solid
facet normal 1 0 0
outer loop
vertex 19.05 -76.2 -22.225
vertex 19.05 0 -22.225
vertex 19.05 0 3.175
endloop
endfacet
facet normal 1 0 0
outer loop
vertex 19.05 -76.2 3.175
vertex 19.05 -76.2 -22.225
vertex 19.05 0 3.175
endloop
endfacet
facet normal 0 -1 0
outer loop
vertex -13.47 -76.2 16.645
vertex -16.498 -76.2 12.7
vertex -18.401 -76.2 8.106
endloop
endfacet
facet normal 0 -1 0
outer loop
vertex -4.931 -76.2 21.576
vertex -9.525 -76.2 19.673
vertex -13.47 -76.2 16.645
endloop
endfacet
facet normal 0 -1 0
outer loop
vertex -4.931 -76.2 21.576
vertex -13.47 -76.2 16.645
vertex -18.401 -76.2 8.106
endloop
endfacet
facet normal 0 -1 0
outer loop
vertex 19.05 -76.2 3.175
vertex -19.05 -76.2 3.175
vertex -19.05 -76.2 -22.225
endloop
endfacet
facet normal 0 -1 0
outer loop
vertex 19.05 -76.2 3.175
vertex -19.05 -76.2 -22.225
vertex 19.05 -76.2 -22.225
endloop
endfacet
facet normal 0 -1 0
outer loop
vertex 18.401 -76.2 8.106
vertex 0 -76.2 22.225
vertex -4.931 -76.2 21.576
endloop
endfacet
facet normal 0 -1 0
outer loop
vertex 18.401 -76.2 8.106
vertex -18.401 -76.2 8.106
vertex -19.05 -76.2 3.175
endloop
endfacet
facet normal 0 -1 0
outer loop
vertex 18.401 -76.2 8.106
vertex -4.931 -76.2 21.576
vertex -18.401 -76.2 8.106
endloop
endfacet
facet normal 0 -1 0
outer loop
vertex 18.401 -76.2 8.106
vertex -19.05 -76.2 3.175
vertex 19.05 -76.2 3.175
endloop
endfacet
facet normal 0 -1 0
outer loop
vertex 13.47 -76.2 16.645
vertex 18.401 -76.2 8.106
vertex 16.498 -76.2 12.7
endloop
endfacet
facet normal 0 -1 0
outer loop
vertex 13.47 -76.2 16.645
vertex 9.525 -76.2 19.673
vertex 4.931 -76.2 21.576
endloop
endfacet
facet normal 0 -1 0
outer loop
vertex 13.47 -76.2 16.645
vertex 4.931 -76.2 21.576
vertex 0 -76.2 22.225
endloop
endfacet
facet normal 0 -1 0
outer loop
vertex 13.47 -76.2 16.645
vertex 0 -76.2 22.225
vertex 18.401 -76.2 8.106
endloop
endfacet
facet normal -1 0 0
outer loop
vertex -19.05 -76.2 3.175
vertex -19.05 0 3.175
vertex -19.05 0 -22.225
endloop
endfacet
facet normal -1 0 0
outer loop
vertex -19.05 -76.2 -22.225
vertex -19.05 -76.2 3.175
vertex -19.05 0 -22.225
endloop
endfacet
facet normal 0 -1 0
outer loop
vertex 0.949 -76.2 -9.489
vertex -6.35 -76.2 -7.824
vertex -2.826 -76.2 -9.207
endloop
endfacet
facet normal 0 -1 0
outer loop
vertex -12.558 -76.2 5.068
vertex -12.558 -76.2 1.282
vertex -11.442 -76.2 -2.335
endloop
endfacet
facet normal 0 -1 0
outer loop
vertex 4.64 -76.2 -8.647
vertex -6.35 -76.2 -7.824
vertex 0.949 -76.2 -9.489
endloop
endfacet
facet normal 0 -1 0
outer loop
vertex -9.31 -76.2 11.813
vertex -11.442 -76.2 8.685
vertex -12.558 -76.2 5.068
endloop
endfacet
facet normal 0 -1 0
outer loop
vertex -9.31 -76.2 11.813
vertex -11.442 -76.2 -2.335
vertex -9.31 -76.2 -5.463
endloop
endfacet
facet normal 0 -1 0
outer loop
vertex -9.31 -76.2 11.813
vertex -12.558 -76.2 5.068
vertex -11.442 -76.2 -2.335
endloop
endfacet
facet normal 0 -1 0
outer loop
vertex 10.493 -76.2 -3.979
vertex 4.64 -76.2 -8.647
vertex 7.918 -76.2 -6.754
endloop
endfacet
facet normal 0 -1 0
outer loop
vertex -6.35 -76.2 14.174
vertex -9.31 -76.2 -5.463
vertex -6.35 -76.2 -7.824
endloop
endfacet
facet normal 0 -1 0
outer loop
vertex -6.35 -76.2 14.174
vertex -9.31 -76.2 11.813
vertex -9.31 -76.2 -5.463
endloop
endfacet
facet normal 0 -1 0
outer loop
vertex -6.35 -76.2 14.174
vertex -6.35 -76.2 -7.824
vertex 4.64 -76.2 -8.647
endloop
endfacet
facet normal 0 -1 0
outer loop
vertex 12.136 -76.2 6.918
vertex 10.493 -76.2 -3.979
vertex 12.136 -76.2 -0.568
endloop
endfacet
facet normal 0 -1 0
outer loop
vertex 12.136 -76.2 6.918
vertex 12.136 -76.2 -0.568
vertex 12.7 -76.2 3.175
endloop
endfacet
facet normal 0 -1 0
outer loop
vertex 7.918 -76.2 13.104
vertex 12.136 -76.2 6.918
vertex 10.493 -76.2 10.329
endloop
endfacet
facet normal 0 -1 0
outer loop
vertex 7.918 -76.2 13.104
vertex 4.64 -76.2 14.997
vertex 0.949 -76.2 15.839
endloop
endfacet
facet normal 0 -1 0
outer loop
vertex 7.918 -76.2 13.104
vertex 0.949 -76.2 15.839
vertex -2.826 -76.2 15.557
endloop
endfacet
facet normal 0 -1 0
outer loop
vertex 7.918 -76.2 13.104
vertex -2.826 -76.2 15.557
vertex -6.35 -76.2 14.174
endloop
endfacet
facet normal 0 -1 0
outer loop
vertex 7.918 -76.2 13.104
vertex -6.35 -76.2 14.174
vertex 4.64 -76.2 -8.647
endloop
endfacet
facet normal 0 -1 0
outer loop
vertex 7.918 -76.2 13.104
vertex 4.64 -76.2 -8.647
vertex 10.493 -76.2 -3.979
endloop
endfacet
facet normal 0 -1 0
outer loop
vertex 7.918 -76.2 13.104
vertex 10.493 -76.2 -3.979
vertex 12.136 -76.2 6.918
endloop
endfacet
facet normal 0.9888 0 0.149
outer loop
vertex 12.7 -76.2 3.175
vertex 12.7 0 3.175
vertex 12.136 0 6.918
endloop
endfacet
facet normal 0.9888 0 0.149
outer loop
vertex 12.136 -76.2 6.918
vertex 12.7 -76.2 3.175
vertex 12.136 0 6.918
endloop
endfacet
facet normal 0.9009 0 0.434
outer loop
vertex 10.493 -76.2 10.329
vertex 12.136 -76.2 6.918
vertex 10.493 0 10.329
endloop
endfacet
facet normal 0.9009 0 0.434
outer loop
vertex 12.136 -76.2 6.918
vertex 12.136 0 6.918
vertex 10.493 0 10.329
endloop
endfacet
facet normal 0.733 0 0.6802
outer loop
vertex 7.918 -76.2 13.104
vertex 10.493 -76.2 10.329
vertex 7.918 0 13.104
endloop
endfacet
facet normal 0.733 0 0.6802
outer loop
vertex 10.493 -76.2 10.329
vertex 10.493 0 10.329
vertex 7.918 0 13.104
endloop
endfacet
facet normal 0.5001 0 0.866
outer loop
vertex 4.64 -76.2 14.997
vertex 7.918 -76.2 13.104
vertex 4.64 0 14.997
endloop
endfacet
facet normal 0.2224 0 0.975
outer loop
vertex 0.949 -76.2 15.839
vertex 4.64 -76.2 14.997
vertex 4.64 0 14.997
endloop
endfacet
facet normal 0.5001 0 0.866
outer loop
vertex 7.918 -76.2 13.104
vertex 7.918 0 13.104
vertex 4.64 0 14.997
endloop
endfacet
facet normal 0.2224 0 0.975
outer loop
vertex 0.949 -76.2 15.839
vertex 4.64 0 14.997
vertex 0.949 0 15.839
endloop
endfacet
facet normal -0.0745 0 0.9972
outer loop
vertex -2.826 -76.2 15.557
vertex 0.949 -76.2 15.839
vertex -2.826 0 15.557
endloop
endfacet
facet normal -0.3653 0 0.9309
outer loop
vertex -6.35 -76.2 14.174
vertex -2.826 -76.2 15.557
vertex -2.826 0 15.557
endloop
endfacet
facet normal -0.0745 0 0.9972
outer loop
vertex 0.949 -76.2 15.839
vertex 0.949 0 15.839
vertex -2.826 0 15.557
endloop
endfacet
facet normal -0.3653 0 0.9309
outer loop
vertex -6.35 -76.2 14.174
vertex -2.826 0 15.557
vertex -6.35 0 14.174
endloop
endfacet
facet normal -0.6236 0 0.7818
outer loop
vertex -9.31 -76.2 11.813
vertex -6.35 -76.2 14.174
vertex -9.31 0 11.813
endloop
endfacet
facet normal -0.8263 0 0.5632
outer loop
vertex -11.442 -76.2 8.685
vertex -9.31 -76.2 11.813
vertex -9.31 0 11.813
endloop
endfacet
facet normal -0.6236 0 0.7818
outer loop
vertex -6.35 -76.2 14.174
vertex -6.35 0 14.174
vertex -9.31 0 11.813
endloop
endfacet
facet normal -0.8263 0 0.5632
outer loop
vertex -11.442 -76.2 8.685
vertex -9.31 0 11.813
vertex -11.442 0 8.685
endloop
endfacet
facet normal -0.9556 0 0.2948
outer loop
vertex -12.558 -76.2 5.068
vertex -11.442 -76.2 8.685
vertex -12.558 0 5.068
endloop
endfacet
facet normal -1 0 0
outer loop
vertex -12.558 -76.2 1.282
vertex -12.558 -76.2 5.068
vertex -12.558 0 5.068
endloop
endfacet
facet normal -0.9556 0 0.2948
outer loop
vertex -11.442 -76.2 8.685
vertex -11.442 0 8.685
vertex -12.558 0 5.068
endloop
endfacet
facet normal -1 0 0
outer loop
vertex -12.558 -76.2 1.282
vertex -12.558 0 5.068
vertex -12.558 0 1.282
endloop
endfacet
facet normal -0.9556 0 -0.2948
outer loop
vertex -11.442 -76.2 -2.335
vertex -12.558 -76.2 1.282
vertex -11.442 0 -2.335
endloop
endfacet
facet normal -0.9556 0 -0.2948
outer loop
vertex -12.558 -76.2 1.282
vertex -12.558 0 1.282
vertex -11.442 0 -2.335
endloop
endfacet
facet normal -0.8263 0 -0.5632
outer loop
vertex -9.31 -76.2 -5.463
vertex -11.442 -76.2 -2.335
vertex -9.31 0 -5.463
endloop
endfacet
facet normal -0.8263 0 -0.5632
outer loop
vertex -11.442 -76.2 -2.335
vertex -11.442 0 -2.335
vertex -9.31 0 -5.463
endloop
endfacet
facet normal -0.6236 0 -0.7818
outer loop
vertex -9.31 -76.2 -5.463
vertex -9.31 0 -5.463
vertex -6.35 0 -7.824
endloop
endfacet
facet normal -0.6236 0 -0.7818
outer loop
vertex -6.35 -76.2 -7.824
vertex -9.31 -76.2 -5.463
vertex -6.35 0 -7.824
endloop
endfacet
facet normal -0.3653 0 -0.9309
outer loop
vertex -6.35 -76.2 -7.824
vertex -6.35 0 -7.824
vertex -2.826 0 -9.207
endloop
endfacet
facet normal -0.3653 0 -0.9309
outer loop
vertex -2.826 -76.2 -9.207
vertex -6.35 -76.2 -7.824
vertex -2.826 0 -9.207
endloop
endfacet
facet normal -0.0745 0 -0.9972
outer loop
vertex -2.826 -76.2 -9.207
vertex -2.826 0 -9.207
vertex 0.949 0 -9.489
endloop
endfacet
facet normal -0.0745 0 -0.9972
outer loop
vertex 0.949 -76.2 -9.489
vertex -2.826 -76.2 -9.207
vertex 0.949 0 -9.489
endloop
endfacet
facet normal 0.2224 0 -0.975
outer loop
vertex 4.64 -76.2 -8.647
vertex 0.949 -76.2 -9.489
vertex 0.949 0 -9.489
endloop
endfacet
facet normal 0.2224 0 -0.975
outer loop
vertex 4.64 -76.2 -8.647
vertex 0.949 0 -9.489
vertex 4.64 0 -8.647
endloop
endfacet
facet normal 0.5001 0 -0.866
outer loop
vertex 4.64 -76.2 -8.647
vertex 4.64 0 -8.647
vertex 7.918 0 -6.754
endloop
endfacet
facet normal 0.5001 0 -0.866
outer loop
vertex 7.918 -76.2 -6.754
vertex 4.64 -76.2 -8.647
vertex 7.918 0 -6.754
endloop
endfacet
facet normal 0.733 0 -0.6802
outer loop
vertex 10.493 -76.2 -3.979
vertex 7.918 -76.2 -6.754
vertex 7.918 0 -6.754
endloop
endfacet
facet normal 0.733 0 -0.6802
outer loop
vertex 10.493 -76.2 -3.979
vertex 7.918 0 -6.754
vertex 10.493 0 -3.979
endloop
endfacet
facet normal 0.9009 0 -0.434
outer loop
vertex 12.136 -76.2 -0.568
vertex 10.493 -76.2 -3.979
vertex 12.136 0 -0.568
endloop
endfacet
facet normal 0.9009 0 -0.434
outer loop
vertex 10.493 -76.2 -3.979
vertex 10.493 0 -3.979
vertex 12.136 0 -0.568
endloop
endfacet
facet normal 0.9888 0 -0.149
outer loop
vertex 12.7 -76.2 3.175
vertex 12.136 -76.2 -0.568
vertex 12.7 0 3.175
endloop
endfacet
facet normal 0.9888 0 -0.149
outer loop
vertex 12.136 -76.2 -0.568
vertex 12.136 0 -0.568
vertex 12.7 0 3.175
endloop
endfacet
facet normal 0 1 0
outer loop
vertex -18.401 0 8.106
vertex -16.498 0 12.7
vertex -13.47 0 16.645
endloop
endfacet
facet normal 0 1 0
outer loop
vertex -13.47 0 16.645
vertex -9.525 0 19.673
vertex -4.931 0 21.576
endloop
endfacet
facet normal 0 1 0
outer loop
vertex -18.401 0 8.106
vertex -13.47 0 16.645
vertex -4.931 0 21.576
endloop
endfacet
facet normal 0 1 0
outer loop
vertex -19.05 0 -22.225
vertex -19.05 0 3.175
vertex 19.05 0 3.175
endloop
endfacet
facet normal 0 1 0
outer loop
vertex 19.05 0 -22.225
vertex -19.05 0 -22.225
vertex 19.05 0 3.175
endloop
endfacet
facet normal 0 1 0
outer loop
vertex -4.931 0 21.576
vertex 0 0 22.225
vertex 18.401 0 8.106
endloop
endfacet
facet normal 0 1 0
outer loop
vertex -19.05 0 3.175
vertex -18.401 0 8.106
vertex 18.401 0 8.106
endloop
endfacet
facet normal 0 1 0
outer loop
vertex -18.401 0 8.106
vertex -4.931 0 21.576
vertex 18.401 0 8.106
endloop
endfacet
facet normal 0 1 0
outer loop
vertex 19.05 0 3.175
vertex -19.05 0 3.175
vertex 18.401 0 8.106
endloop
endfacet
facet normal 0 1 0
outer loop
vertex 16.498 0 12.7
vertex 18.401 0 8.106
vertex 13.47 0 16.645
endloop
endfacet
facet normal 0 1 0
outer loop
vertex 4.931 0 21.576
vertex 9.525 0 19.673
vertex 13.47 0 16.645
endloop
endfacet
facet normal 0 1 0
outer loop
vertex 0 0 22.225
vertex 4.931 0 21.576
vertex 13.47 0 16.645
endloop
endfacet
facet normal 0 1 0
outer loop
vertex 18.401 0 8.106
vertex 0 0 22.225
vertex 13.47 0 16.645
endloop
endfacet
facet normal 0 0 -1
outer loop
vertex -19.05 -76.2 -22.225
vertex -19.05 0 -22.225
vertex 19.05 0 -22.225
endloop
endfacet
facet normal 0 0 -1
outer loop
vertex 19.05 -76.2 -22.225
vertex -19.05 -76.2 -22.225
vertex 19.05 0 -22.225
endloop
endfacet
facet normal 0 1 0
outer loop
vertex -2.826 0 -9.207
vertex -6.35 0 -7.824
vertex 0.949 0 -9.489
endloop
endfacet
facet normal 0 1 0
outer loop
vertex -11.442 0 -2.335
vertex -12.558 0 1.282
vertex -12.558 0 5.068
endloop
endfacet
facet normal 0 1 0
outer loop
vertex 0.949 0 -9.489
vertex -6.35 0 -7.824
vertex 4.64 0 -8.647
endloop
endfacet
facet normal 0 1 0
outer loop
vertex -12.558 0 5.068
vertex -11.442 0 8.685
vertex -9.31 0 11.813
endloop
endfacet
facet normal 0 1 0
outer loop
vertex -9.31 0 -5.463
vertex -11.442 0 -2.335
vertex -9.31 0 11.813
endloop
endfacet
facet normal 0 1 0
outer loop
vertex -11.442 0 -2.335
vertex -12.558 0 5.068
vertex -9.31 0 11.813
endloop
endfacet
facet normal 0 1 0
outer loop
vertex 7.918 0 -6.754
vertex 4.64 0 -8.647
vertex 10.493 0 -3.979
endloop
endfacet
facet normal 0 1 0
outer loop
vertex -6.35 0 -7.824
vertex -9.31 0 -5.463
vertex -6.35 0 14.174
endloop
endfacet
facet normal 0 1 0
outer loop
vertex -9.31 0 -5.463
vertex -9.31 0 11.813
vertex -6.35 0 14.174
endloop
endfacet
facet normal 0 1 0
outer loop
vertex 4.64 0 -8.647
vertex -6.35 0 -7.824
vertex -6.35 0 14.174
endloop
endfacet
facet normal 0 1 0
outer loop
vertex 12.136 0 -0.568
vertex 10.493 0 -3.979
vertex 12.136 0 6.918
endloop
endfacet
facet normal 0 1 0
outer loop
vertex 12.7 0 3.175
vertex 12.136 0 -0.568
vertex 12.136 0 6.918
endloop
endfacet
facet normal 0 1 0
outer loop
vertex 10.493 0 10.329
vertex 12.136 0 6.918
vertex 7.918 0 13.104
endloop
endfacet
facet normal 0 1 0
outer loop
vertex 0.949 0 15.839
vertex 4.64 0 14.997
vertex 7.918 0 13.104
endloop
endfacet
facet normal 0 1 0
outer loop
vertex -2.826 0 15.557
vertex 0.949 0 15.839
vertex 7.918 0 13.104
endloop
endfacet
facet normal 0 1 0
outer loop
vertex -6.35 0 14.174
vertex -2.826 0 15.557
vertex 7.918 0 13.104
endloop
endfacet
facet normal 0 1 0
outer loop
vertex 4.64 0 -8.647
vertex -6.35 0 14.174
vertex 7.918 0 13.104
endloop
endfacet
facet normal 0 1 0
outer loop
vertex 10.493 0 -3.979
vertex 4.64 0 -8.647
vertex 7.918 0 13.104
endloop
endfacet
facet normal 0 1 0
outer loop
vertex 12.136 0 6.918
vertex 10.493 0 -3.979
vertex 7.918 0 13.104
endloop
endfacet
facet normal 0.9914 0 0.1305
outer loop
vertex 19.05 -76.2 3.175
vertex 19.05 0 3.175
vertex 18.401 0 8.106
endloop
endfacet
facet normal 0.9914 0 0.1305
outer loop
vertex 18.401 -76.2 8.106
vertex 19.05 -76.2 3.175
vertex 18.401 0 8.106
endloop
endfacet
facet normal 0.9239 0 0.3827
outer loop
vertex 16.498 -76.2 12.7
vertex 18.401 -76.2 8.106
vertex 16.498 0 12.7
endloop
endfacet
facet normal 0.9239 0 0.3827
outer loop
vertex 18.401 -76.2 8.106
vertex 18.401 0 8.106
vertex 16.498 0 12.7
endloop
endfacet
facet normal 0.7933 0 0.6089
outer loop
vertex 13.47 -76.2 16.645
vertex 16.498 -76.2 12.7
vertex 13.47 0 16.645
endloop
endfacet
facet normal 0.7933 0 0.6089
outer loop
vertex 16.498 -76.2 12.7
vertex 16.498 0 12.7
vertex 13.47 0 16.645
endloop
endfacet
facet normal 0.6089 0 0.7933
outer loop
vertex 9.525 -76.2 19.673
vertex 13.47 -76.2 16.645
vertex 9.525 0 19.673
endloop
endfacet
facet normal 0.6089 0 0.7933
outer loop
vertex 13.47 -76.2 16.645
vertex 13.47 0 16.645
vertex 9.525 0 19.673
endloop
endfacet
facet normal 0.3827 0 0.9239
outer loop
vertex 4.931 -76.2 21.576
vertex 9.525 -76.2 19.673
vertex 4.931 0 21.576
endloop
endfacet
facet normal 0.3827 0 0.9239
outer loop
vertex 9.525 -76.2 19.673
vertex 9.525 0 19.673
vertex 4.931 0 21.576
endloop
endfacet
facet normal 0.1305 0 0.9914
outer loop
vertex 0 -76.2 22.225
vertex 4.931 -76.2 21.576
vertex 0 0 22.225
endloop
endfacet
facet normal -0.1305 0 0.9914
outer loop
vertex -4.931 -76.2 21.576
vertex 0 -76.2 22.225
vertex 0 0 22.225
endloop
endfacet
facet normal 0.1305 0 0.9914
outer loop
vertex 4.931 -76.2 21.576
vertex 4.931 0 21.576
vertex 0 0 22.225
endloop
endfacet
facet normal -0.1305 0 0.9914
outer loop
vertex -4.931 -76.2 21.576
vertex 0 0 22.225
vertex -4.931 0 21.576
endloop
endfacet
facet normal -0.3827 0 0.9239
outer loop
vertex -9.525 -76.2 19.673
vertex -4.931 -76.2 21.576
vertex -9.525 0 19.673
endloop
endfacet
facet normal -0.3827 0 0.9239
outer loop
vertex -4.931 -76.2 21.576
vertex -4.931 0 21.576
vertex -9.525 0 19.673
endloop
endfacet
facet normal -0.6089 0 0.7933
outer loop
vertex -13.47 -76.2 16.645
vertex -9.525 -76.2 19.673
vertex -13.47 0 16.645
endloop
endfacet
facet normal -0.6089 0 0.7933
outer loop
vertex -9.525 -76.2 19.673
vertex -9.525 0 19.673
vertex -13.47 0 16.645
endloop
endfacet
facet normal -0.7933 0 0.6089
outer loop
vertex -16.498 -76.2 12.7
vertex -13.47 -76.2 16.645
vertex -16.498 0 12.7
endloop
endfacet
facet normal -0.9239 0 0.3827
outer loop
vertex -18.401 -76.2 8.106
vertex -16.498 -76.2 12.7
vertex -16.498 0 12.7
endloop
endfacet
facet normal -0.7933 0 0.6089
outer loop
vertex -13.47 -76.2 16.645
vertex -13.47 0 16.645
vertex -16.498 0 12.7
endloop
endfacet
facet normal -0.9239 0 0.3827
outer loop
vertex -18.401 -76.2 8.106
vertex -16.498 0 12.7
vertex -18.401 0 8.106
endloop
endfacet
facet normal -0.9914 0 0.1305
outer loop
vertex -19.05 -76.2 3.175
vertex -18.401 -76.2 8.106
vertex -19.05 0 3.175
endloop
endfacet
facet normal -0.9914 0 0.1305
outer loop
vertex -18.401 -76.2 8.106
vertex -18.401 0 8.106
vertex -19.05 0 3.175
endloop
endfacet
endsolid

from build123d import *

# Parameters (mm, degrees)
F1_R     = 12.7
F2_DEPTH = 76.2


# Not quite as in the source:
# - a feature of the source that left no trace in its solid (it failed there, or was rolled back) is left out


with BuildPart() as f2:
    # F1 (on face) → F2 (new body)
    with BuildSketch(Plane.XZ):
        with Locations((0, 3.175)):
            Circle(F1_R)
    extrude(amount=F2_DEPTH)


with BuildPart() as f2b:
    # F0 (on Front) → F2, piece 2 (new body)
    with BuildSketch(Plane.XZ):
        with BuildLine():
            Line((-19.05, 3.175), (-19.05, -22.225))
            Line((-19.05, -22.225), (19.05, -22.225))
            Line((19.05, -22.225), (19.05, 3.175))
            ThreePointArc((19.05, 3.175), (0, -15.875), (-19.05, 3.175))
        make_face()
        with BuildLine():
            ThreePointArc((19.05, 3.175), (0, 22.225), (-19.05, 3.175))
            ThreePointArc((-19.05, 3.175), (0, -15.875), (19.05, 3.175))
        make_face()
    extrude(amount=F2_DEPTH)


solid = Compound([f2.part, f2b.part])
